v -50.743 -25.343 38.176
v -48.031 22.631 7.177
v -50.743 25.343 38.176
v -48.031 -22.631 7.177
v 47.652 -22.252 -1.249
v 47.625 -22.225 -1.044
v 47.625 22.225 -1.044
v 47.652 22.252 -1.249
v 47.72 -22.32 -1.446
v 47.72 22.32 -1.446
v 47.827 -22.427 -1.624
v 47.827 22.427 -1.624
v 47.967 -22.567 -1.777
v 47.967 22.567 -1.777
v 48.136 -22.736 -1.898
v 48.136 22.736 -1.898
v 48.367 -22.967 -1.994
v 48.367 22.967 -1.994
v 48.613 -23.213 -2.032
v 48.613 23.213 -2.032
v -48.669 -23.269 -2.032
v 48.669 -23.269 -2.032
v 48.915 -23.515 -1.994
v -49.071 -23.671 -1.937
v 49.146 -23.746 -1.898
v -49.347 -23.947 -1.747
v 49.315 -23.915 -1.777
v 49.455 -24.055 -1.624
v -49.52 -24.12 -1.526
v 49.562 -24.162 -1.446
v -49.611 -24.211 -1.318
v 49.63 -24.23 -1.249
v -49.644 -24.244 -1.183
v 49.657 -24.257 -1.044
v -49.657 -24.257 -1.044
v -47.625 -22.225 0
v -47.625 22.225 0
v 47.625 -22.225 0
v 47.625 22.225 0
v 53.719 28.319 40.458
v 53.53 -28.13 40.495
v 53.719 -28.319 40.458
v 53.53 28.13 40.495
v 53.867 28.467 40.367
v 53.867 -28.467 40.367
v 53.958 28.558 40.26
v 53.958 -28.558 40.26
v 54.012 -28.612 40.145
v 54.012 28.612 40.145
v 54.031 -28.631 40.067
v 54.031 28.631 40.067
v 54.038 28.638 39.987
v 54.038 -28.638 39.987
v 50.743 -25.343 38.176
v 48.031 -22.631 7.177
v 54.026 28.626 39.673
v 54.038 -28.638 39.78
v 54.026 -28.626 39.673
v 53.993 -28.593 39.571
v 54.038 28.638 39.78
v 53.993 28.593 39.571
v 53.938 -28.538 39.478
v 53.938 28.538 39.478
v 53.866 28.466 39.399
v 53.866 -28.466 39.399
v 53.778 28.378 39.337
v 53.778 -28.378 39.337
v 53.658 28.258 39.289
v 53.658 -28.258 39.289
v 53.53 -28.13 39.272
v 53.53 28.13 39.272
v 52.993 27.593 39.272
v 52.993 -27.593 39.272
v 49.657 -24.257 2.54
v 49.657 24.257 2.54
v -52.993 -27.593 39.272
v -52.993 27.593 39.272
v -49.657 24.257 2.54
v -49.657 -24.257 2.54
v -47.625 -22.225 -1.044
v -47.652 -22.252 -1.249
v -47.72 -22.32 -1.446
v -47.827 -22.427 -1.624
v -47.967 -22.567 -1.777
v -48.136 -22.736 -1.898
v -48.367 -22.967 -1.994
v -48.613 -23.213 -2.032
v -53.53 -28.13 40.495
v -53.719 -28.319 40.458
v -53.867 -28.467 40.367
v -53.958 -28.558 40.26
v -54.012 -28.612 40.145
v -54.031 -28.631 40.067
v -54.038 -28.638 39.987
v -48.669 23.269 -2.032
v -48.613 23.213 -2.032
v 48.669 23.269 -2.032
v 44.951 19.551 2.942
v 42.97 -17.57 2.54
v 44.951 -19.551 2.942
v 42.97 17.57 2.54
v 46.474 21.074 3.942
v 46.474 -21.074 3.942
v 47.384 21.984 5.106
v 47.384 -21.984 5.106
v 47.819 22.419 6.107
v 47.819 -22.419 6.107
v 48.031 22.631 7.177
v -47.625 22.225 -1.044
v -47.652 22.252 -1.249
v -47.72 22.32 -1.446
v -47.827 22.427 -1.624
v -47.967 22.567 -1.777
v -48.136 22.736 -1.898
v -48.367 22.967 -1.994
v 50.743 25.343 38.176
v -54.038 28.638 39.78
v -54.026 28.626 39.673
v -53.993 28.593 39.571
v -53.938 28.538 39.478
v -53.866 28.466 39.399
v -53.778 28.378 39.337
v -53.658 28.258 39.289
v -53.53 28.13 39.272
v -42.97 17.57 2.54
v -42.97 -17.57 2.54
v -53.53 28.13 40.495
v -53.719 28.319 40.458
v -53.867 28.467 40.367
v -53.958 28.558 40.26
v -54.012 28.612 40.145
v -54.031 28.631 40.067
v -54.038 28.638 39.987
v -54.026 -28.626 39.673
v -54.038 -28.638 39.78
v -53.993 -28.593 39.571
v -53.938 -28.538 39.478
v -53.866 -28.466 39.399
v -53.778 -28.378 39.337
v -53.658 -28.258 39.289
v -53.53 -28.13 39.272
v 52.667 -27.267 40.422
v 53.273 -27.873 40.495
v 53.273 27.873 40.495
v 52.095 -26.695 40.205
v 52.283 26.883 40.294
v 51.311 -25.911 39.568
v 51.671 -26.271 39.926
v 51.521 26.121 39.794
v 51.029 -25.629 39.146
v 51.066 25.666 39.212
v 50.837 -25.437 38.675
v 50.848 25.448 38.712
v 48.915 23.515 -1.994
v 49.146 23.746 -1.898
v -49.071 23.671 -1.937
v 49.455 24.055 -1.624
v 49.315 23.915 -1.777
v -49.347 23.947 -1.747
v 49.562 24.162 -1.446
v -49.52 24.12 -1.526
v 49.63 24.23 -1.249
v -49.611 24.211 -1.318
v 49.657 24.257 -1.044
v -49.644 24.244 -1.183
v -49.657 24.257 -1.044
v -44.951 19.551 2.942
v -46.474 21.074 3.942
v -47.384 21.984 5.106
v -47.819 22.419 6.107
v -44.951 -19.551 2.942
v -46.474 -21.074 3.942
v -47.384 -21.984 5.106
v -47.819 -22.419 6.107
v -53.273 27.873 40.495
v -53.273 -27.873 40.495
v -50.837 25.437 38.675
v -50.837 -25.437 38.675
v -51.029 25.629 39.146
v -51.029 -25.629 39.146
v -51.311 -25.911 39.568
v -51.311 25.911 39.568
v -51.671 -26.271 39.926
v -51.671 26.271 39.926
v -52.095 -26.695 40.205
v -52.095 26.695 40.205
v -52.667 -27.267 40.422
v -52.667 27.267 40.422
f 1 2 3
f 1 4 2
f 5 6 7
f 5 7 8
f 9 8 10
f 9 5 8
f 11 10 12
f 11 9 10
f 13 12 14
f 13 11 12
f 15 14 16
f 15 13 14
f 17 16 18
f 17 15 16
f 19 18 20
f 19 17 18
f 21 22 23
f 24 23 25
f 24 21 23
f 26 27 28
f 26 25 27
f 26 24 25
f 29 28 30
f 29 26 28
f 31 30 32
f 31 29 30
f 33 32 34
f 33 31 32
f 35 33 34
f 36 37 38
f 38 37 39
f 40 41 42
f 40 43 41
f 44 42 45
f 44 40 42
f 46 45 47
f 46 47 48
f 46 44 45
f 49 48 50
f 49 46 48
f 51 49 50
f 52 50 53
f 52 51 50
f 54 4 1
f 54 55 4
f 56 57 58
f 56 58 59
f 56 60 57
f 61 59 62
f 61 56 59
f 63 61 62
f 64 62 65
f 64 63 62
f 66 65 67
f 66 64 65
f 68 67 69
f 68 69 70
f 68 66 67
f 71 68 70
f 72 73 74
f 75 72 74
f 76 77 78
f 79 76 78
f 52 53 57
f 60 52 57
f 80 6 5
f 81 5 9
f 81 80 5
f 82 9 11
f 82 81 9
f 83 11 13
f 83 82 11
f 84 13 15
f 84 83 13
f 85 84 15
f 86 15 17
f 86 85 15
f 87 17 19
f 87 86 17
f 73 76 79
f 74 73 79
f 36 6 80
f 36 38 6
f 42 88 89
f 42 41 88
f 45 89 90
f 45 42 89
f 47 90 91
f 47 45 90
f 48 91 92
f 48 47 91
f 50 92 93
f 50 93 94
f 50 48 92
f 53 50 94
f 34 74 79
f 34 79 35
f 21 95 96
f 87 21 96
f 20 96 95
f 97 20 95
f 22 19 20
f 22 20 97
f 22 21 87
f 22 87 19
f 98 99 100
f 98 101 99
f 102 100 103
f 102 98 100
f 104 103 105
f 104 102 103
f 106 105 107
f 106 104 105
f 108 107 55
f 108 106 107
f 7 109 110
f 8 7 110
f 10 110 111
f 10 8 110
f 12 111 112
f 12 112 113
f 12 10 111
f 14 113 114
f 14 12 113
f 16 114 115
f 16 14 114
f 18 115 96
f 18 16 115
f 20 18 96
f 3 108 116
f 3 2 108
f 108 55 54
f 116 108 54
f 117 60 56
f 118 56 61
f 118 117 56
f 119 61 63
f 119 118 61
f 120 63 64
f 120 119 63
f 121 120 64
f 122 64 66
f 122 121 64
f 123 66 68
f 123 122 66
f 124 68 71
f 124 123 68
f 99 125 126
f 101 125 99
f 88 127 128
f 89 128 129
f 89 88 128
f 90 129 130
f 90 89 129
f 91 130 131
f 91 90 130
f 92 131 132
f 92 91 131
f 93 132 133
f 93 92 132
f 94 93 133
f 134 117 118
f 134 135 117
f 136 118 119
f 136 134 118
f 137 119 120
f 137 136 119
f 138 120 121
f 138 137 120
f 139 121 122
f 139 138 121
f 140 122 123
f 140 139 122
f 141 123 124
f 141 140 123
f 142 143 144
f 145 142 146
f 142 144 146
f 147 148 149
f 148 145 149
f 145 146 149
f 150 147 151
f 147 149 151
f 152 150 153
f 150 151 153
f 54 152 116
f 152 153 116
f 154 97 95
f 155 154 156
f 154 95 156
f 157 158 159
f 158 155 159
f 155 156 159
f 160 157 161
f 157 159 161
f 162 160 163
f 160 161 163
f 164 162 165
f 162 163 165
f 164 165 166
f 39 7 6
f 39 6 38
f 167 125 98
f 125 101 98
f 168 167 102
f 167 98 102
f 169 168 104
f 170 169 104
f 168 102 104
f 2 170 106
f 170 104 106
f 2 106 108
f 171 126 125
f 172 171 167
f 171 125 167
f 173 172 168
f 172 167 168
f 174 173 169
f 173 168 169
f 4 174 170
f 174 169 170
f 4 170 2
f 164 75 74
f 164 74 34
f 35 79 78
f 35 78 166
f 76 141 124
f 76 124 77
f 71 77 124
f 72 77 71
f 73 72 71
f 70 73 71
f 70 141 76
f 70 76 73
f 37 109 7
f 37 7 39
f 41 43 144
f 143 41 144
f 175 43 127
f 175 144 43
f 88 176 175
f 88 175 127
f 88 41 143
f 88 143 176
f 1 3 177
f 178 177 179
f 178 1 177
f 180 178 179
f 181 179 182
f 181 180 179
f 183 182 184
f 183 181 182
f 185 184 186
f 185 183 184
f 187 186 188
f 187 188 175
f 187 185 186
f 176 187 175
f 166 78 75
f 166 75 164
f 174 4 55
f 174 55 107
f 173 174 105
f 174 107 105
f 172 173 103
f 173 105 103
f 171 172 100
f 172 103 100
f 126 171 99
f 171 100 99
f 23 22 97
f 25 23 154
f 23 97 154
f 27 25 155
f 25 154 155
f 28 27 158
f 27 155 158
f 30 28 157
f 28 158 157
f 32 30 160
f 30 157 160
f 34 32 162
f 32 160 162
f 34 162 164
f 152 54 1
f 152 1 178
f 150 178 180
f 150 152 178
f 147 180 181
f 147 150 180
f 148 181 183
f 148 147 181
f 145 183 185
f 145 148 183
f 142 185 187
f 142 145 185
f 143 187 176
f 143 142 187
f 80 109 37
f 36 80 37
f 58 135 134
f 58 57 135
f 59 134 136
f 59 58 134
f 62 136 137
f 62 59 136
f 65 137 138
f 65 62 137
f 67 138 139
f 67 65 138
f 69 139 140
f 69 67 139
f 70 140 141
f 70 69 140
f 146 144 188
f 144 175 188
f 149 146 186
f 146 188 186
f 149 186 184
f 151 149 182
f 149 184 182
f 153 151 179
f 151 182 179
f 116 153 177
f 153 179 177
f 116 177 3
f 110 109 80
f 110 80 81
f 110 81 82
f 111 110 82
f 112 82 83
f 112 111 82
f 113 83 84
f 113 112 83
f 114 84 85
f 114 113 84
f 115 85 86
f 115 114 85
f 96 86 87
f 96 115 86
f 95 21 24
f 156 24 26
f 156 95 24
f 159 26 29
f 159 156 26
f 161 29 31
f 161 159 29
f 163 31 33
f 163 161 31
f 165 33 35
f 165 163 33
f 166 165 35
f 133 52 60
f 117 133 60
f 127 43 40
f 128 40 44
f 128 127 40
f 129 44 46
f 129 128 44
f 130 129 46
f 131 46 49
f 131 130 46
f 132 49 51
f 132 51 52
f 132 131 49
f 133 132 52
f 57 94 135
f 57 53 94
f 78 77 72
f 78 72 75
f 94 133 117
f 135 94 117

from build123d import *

# Parameters (mm, degrees)
F0_W         = 95.25
F0_H         = 44.45
F1_DEPTH     = 2.54
F4_T1_DEPTH  = 44.45
F4_T3_DEPTH  = 95.25
F4_T5_DEPTH  = 53.5988288205
F4_T7_DEPTH  = 104.3988288205
F4_T13_DEPTH = 46.9924144102
F4_T18_DEPTH = 97.7924144102
F4_T26_DEPTH = 46.9924144102
F4_T31_DEPTH = 97.7924144102
F4_T39_DEPTH = 97.7924144102
F4_T44_DEPTH = 46.9924144102
F4_T52_DEPTH = 46.9924144102
F4_T57_DEPTH = 97.7924144102
F5_R         = 5.08
F6_R         = 2.54
F7_R         = 0.508


# Not quite as in the source:
# - a fillet or chamfer that OpenCascade refuses, or shapes differently, is made with other operations: its cross-section is extruded or revolved along the edge and cut away or added


with BuildPart() as f1:
    # F0 (on Top) → F1 (new body)
    with BuildSketch(Plane.XY):
        Rectangle(F0_W, F0_H)
    extrude(amount=F1_DEPTH)

    # F3: sweep along a path in F3_path
    with BuildLine(Plane(origin=(-47.625, 22.225, 2.54), x_dir=(0, -1, 0), z_dir=(0, 0, -1))) as f3_path:
        Line((0, 0), (44.45, 0))
        Line((44.45, 0), (44.45, -95.25))
        Line((44.45, -95.25), (0, -95.25))
        Line((0, -95.25), (0, 0))
    # F2 (on face) → F3 (sweep)
    with BuildSketch(Plane.XZ.offset(22.225)):
        Polygon((-52.9928505421, 39.2721965909), (-49.657, 2.54), (-49.657, -2.032), (-47.625, -2.032), (-47.625, 0), (-47.625, 2.54), (-50.9456337987, 40.4950179973), (-54.0375709534, 40.4950179973), (-54.0375709534, 39.2721965909), align=None)
    sweep(path=f3_path.line, transition=Transition.RIGHT)

    # F4: fillet of radius 1.016 on 16 edges, made by hand

    # F4_s2 → F4_t1 (cut)
    with BuildSketch(Plane.XZ.offset(-22.225)):
        with BuildLine():
            ThreePointArc((47.6246, -1.0150343146), (47.9225795103, -1.7344204897), (48.6419656854, -2.0324))
            Line((48.6419656854, -2.0324), (48.6419656854, -2.1341365685))
            ThreePointArc((48.6419656854, -2.1341365685), (48.1334828427, -2.1337365685), (47.625, -2.1337365685))
            Line((47.625, -2.1337365685), (47.5232634315, -2.032))
            ThreePointArc((47.5232634315, -2.032), (47.5232634315, -1.5235171573), (47.5228634315, -1.0150343146))
            Line((47.5228634315, -1.0150343146), (47.6246, -1.0150343146))
        make_face()
        with BuildLine():
            ThreePointArc((-47.6246, -1.0150343146), (-47.9225795103, -1.7344204897), (-48.6419656854, -2.0324))
            Line((-48.6419656854, -2.0324), (-48.6419656854, -2.1341365685))
            ThreePointArc((-48.6419656854, -2.1341365685), (-48.1334828427, -2.1337365685), (-47.625, -2.1337365685))
            Line((-47.625, -2.1337365685), (-47.5232634315, -2.032))
            ThreePointArc((-47.5232634315, -2.032), (-47.5232634315, -1.5235171573), (-47.5228634315, -1.0150343146))
            Line((-47.5228634315, -1.0150343146), (-47.6246, -1.0150343146))
        make_face()
    extrude(amount=F4_T1_DEPTH, mode=Mode.SUBTRACT)

    # F4_s4 → F4_t3 (cut)
    with BuildSketch(Plane.YZ.offset(-47.625)):
        with BuildLine():
            ThreePointArc((22.2246, -1.0150343146), (22.5225795103, -1.7344204897), (23.2419656854, -2.0324))
            Line((23.2419656854, -2.0324), (23.2419656854, -2.1341365685))
            ThreePointArc((23.2419656854, -2.1341365685), (22.7334828427, -2.1337365685), (22.225, -2.1337365685))
            Line((22.225, -2.1337365685), (22.1232634315, -2.032))
            ThreePointArc((22.1232634315, -2.032), (22.1232634315, -1.5235171573), (22.1228634315, -1.0150343146))
            Line((22.1228634315, -1.0150343146), (22.2246, -1.0150343146))
        make_face()
        with BuildLine():
            ThreePointArc((-22.2246, -1.0150343146), (-22.5225795103, -1.7344204897), (-23.2419656854, -2.0324))
            Line((-23.2419656854, -2.0324), (-23.2419656854, -2.1341365685))
            ThreePointArc((-23.2419656854, -2.1341365685), (-22.7334828427, -2.1337365685), (-22.225, -2.1337365685))
            Line((-22.225, -2.1337365685), (-22.1232634315, -2.032))
            ThreePointArc((-22.1232634315, -2.032), (-22.1232634315, -1.5235171573), (-22.1228634315, -1.0150343146))
            Line((-22.1228634315, -1.0150343146), (-22.2246, -1.0150343146))
        make_face()
    extrude(amount=F4_T3_DEPTH, mode=Mode.SUBTRACT)

    # F4_s6 → F4_t5 (cut)
    with BuildSketch(Plane.XZ.offset(-26.7994144102)):
        with BuildLine():
            ThreePointArc((-48.6400343146, -2.0324), (-49.3594204897, -1.7344204897), (-49.6574, -1.0150343146))
            Line((-49.6574, -1.0150343146), (-49.7591365685, -1.0150343146))
            ThreePointArc((-49.7591365685, -1.0150343146), (-49.7587365685, -1.5235171573), (-49.7587365685, -2.032))
            Line((-49.7587365685, -2.032), (-49.657, -2.1337365685))
            ThreePointArc((-49.657, -2.1337365685), (-49.1485171573, -2.1337365685), (-48.6400343146, -2.1341365685))
            Line((-48.6400343146, -2.1341365685), (-48.6400343146, -2.0324))
        make_face()
        with BuildLine():
            ThreePointArc((48.6400343146, -2.0324), (49.3594204897, -1.7344204897), (49.6574, -1.0150343146))
            Line((49.6574, -1.0150343146), (49.7591365685, -1.0150343146))
            ThreePointArc((49.7591365685, -1.0150343146), (49.7587365685, -1.5235171573), (49.7587365685, -2.032))
            Line((49.7587365685, -2.032), (49.657, -2.1337365685))
            ThreePointArc((49.657, -2.1337365685), (49.1485171573, -2.1337365685), (48.6400343146, -2.1341365685))
            Line((48.6400343146, -2.1341365685), (48.6400343146, -2.0324))
        make_face()
    extrude(amount=F4_T5_DEPTH, mode=Mode.SUBTRACT)

    # F4_s8 → F4_t7 (cut)
    with BuildSketch(Plane.YZ.offset(-52.1994144102)):
        with BuildLine():
            ThreePointArc((23.2400343146, -2.0324), (23.9594204897, -1.7344204897), (24.2574, -1.0150343146))
            Line((24.2574, -1.0150343146), (24.3591365685, -1.0150343146))
            ThreePointArc((24.3591365685, -1.0150343146), (24.3587365685, -1.5235171573), (24.3587365685, -2.032))
            Line((24.3587365685, -2.032), (24.257, -2.1337365685))
            ThreePointArc((24.257, -2.1337365685), (23.7485171573, -2.1337365685), (23.2400343146, -2.1341365685))
            Line((23.2400343146, -2.1341365685), (23.2400343146, -2.0324))
        make_face()
        with BuildLine():
            ThreePointArc((-23.2400343146, -2.0324), (-23.9594204897, -1.7344204897), (-24.2574, -1.0150343146))
            Line((-24.2574, -1.0150343146), (-24.3591365685, -1.0150343146))
            ThreePointArc((-24.3591365685, -1.0150343146), (-24.3587365685, -1.5235171573), (-24.3587365685, -2.032))
            Line((-24.3587365685, -2.032), (-24.257, -2.1337365685))
            ThreePointArc((-24.257, -2.1337365685), (-23.7485171573, -2.1337365685), (-23.2400343146, -2.1341365685))
            Line((-23.2400343146, -2.1341365685), (-23.2400343146, -2.0324))
        make_face()
    extrude(amount=F4_T7_DEPTH, mode=Mode.SUBTRACT)


with BuildPart() as f4_tool11:
    # F4_s12 → F4_t13 (new body)
    with BuildSketch(Plane.XZ.offset(24.7674144102)):
        with BuildLine():
            ThreePointArc((47.6246, -1.0150343146), (47.9225795103, -1.7344204897), (48.6419656854, -2.0324))
            Line((48.6419656854, -2.0324), (48.6419656854, -2.1341365685))
            ThreePointArc((48.6419656854, -2.1341365685), (48.1334828427, -2.1337365685), (47.625, -2.1337365685))
            Line((47.625, -2.1337365685), (47.5232634315, -2.032))
            ThreePointArc((47.5232634315, -2.032), (47.5232634315, -1.5235171573), (47.5228634315, -1.0150343146))
            Line((47.5228634315, -1.0150343146), (47.6246, -1.0150343146))
        make_face()
    extrude(amount=-F4_T13_DEPTH)

    split(bisect_by=Plane.XZ.offset(22.225), keep=Keep.TOP)

    split(bisect_by=Plane.XZ.offset(24.257), keep=Keep.BOTTOM)


with BuildPart() as f4_tool16:
    # F4_s17 → F4_t18 (new body)
    with BuildSketch(Plane.YZ.offset(-47.625)):
        with BuildLine():
            ThreePointArc((-22.2246, -1.0150343146), (-22.5225795103, -1.7344204897), (-23.2419656854, -2.0324))
            Line((-23.2419656854, -2.0324), (-23.2419656854, -2.1341365685))
            ThreePointArc((-23.2419656854, -2.1341365685), (-22.7334828427, -2.1337365685), (-22.225, -2.1337365685))
            Line((-22.225, -2.1337365685), (-22.1232634315, -2.032))
            ThreePointArc((-22.1232634315, -2.032), (-22.1232634315, -1.5235171573), (-22.1228634315, -1.0150343146))
            Line((-22.1228634315, -1.0150343146), (-22.2246, -1.0150343146))
        make_face()
    extrude(amount=F4_T18_DEPTH)

    split(bisect_by=Plane.YZ.offset(47.625), keep=Keep.TOP)

    split(bisect_by=Plane.YZ.offset(49.657), keep=Keep.BOTTOM)


with BuildPart() as f4_tool11_1:
    add(f4_tool11.part)

    # F4_t21: intersect F4_tool16
    add(f4_tool16.part, mode=Mode.INTERSECT)


with BuildPart() as f1_1:
    add(f1.part)

    # F4_t9: cut F4_tool11
    add(f4_tool11_1.part, mode=Mode.SUBTRACT)


with BuildPart() as f4_tool24:
    # F4_s25 → F4_t26 (new body)
    with BuildSketch(Plane.XZ.offset(22.225)):
        with BuildLine():
            ThreePointArc((47.6246, -1.0150343146), (47.9225795103, -1.7344204897), (48.6419656854, -2.0324))
            Line((48.6419656854, -2.0324), (48.6419656854, -2.1341365685))
            ThreePointArc((48.6419656854, -2.1341365685), (48.1334828427, -2.1337365685), (47.625, -2.1337365685))
            Line((47.625, -2.1337365685), (47.5232634315, -2.032))
            ThreePointArc((47.5232634315, -2.032), (47.5232634315, -1.5235171573), (47.5228634315, -1.0150343146))
            Line((47.5228634315, -1.0150343146), (47.6246, -1.0150343146))
        make_face()
    extrude(amount=-F4_T26_DEPTH)

    split(bisect_by=Plane.XZ.offset(-22.225), keep=Keep.BOTTOM)

    split(bisect_by=Plane.XZ.offset(-24.257), keep=Keep.TOP)


with BuildPart() as f4_tool29:
    # F4_s30 → F4_t31 (new body)
    with BuildSketch(Plane.YZ.offset(50.1674144102)):
        with BuildLine():
            ThreePointArc((22.2246, -1.0150343146), (22.5225795103, -1.7344204897), (23.2419656854, -2.0324))
            Line((23.2419656854, -2.0324), (23.2419656854, -2.1341365685))
            ThreePointArc((23.2419656854, -2.1341365685), (22.7334828427, -2.1337365685), (22.225, -2.1337365685))
            Line((22.225, -2.1337365685), (22.1232634315, -2.032))
            ThreePointArc((22.1232634315, -2.032), (22.1232634315, -1.5235171573), (22.1228634315, -1.0150343146))
            Line((22.1228634315, -1.0150343146), (22.2246, -1.0150343146))
        make_face()
    extrude(amount=-F4_T31_DEPTH)

    split(bisect_by=Plane.YZ.offset(47.625), keep=Keep.TOP)

    split(bisect_by=Plane.YZ.offset(49.657), keep=Keep.BOTTOM)


with BuildPart() as f4_tool24_1:
    add(f4_tool24.part)

    # F4_t34: intersect F4_tool29
    add(f4_tool29.part, mode=Mode.INTERSECT)


with BuildPart() as f1_2:
    add(f1_1.part)

    # F4_t22: cut F4_tool24
    add(f4_tool24_1.part, mode=Mode.SUBTRACT)


with BuildPart() as f4_tool37:
    # F4_s38 → F4_t39 (new body)
    with BuildSketch(Plane.YZ.offset(47.625)):
        with BuildLine():
            ThreePointArc((22.2246, -1.0150343146), (22.5225795103, -1.7344204897), (23.2419656854, -2.0324))
            Line((23.2419656854, -2.0324), (23.2419656854, -2.1341365685))
            ThreePointArc((23.2419656854, -2.1341365685), (22.7334828427, -2.1337365685), (22.225, -2.1337365685))
            Line((22.225, -2.1337365685), (22.1232634315, -2.032))
            ThreePointArc((22.1232634315, -2.032), (22.1232634315, -1.5235171573), (22.1228634315, -1.0150343146))
            Line((22.1228634315, -1.0150343146), (22.2246, -1.0150343146))
        make_face()
    extrude(amount=-F4_T39_DEPTH)

    split(bisect_by=Plane.YZ.offset(-47.625), keep=Keep.BOTTOM)

    split(bisect_by=Plane.YZ.offset(-49.657), keep=Keep.TOP)


with BuildPart() as f4_tool42:
    # F4_s43 → F4_t44 (new body)
    with BuildSketch(Plane.XZ.offset(-24.7674144102)):
        with BuildLine():
            ThreePointArc((-47.6246, -1.0150343146), (-47.9225795103, -1.7344204897), (-48.6419656854, -2.0324))
            Line((-48.6419656854, -2.0324), (-48.6419656854, -2.1341365685))
            ThreePointArc((-48.6419656854, -2.1341365685), (-48.1334828427, -2.1337365685), (-47.625, -2.1337365685))
            Line((-47.625, -2.1337365685), (-47.5232634315, -2.032))
            ThreePointArc((-47.5232634315, -2.032), (-47.5232634315, -1.5235171573), (-47.5228634315, -1.0150343146))
            Line((-47.5228634315, -1.0150343146), (-47.6246, -1.0150343146))
        make_face()
    extrude(amount=F4_T44_DEPTH)

    split(bisect_by=Plane.XZ.offset(-22.225), keep=Keep.BOTTOM)

    split(bisect_by=Plane.XZ.offset(-24.257), keep=Keep.TOP)


with BuildPart() as f4_tool37_1:
    add(f4_tool37.part)

    # F4_t47: intersect F4_tool42
    add(f4_tool42.part, mode=Mode.INTERSECT)


with BuildPart() as f1_3:
    add(f1_2.part)

    # F4_t35: cut F4_tool37
    add(f4_tool37_1.part, mode=Mode.SUBTRACT)


with BuildPart() as f4_tool50:
    # F4_s51 → F4_t52 (new body)
    with BuildSketch(Plane.XZ.offset(-22.225)):
        with BuildLine():
            ThreePointArc((-47.6246, -1.0150343146), (-47.9225795103, -1.7344204897), (-48.6419656854, -2.0324))
            Line((-48.6419656854, -2.0324), (-48.6419656854, -2.1341365685))
            ThreePointArc((-48.6419656854, -2.1341365685), (-48.1334828427, -2.1337365685), (-47.625, -2.1337365685))
            Line((-47.625, -2.1337365685), (-47.5232634315, -2.032))
            ThreePointArc((-47.5232634315, -2.032), (-47.5232634315, -1.5235171573), (-47.5228634315, -1.0150343146))
            Line((-47.5228634315, -1.0150343146), (-47.6246, -1.0150343146))
        make_face()
    extrude(amount=F4_T52_DEPTH)

    split(bisect_by=Plane.XZ.offset(22.225), keep=Keep.TOP)

    split(bisect_by=Plane.XZ.offset(24.257), keep=Keep.BOTTOM)


with BuildPart() as f4_tool55:
    # F4_s56 → F4_t57 (new body)
    with BuildSketch(Plane.YZ.offset(-50.1674144102)):
        with BuildLine():
            ThreePointArc((-22.2246, -1.0150343146), (-22.5225795103, -1.7344204897), (-23.2419656854, -2.0324))
            Line((-23.2419656854, -2.0324), (-23.2419656854, -2.1341365685))
            ThreePointArc((-23.2419656854, -2.1341365685), (-22.7334828427, -2.1337365685), (-22.225, -2.1337365685))
            Line((-22.225, -2.1337365685), (-22.1232634315, -2.032))
            ThreePointArc((-22.1232634315, -2.032), (-22.1232634315, -1.5235171573), (-22.1228634315, -1.0150343146))
            Line((-22.1228634315, -1.0150343146), (-22.2246, -1.0150343146))
        make_face()
    extrude(amount=F4_T57_DEPTH)

    split(bisect_by=Plane.YZ.offset(-47.625), keep=Keep.BOTTOM)

    split(bisect_by=Plane.YZ.offset(-49.657), keep=Keep.TOP)


with BuildPart() as f4_tool50_1:
    add(f4_tool50.part)

    # F4_t60: intersect F4_tool55
    add(f4_tool55.part, mode=Mode.INTERSECT)


with BuildPart() as f1_4:
    add(f1_3.part)

    # F4_t48: cut F4_tool50
    add(f4_tool50_1.part, mode=Mode.SUBTRACT)

    # F5
    f5_edges = [f1_4.edges().sort_by_distance(p)[0] for p in [
        (0, 22.225, 2.54),
        (-47.625, 0, 2.54),
        (47.625, 0, 2.54),
        (0, -22.225, 2.54),
    ]]
    fillet(f5_edges, radius=F5_R)

    # F6
    f6_edges = [f1_4.edges().sort_by_distance(p)[0] for p in [
        (0, -25.545634, 40.495018),
        (-50.945634, 0, 40.495018),
        (0, 25.545634, 40.495018),
        (50.945634, 0, 40.495018),
    ]]
    fillet(f6_edges, radius=F6_R)

    # F7
    f7_edges = [f1_4.edges().sort_by_distance(p)[0] for p in [
        (-54.037571, 0, 40.495018),
        (0, -28.637571, 40.495018),
        (54.037571, 0, 40.495018),
        (0, 28.637571, 40.495018),
        (-54.037571, 0, 39.272197),
        (0, -28.637571, 39.272197),
        (54.037571, 0, 39.272197),
        (0, 28.637571, 39.272197),
    ]]
    fillet(f7_edges, radius=F7_R)


solid = f1_4.part
